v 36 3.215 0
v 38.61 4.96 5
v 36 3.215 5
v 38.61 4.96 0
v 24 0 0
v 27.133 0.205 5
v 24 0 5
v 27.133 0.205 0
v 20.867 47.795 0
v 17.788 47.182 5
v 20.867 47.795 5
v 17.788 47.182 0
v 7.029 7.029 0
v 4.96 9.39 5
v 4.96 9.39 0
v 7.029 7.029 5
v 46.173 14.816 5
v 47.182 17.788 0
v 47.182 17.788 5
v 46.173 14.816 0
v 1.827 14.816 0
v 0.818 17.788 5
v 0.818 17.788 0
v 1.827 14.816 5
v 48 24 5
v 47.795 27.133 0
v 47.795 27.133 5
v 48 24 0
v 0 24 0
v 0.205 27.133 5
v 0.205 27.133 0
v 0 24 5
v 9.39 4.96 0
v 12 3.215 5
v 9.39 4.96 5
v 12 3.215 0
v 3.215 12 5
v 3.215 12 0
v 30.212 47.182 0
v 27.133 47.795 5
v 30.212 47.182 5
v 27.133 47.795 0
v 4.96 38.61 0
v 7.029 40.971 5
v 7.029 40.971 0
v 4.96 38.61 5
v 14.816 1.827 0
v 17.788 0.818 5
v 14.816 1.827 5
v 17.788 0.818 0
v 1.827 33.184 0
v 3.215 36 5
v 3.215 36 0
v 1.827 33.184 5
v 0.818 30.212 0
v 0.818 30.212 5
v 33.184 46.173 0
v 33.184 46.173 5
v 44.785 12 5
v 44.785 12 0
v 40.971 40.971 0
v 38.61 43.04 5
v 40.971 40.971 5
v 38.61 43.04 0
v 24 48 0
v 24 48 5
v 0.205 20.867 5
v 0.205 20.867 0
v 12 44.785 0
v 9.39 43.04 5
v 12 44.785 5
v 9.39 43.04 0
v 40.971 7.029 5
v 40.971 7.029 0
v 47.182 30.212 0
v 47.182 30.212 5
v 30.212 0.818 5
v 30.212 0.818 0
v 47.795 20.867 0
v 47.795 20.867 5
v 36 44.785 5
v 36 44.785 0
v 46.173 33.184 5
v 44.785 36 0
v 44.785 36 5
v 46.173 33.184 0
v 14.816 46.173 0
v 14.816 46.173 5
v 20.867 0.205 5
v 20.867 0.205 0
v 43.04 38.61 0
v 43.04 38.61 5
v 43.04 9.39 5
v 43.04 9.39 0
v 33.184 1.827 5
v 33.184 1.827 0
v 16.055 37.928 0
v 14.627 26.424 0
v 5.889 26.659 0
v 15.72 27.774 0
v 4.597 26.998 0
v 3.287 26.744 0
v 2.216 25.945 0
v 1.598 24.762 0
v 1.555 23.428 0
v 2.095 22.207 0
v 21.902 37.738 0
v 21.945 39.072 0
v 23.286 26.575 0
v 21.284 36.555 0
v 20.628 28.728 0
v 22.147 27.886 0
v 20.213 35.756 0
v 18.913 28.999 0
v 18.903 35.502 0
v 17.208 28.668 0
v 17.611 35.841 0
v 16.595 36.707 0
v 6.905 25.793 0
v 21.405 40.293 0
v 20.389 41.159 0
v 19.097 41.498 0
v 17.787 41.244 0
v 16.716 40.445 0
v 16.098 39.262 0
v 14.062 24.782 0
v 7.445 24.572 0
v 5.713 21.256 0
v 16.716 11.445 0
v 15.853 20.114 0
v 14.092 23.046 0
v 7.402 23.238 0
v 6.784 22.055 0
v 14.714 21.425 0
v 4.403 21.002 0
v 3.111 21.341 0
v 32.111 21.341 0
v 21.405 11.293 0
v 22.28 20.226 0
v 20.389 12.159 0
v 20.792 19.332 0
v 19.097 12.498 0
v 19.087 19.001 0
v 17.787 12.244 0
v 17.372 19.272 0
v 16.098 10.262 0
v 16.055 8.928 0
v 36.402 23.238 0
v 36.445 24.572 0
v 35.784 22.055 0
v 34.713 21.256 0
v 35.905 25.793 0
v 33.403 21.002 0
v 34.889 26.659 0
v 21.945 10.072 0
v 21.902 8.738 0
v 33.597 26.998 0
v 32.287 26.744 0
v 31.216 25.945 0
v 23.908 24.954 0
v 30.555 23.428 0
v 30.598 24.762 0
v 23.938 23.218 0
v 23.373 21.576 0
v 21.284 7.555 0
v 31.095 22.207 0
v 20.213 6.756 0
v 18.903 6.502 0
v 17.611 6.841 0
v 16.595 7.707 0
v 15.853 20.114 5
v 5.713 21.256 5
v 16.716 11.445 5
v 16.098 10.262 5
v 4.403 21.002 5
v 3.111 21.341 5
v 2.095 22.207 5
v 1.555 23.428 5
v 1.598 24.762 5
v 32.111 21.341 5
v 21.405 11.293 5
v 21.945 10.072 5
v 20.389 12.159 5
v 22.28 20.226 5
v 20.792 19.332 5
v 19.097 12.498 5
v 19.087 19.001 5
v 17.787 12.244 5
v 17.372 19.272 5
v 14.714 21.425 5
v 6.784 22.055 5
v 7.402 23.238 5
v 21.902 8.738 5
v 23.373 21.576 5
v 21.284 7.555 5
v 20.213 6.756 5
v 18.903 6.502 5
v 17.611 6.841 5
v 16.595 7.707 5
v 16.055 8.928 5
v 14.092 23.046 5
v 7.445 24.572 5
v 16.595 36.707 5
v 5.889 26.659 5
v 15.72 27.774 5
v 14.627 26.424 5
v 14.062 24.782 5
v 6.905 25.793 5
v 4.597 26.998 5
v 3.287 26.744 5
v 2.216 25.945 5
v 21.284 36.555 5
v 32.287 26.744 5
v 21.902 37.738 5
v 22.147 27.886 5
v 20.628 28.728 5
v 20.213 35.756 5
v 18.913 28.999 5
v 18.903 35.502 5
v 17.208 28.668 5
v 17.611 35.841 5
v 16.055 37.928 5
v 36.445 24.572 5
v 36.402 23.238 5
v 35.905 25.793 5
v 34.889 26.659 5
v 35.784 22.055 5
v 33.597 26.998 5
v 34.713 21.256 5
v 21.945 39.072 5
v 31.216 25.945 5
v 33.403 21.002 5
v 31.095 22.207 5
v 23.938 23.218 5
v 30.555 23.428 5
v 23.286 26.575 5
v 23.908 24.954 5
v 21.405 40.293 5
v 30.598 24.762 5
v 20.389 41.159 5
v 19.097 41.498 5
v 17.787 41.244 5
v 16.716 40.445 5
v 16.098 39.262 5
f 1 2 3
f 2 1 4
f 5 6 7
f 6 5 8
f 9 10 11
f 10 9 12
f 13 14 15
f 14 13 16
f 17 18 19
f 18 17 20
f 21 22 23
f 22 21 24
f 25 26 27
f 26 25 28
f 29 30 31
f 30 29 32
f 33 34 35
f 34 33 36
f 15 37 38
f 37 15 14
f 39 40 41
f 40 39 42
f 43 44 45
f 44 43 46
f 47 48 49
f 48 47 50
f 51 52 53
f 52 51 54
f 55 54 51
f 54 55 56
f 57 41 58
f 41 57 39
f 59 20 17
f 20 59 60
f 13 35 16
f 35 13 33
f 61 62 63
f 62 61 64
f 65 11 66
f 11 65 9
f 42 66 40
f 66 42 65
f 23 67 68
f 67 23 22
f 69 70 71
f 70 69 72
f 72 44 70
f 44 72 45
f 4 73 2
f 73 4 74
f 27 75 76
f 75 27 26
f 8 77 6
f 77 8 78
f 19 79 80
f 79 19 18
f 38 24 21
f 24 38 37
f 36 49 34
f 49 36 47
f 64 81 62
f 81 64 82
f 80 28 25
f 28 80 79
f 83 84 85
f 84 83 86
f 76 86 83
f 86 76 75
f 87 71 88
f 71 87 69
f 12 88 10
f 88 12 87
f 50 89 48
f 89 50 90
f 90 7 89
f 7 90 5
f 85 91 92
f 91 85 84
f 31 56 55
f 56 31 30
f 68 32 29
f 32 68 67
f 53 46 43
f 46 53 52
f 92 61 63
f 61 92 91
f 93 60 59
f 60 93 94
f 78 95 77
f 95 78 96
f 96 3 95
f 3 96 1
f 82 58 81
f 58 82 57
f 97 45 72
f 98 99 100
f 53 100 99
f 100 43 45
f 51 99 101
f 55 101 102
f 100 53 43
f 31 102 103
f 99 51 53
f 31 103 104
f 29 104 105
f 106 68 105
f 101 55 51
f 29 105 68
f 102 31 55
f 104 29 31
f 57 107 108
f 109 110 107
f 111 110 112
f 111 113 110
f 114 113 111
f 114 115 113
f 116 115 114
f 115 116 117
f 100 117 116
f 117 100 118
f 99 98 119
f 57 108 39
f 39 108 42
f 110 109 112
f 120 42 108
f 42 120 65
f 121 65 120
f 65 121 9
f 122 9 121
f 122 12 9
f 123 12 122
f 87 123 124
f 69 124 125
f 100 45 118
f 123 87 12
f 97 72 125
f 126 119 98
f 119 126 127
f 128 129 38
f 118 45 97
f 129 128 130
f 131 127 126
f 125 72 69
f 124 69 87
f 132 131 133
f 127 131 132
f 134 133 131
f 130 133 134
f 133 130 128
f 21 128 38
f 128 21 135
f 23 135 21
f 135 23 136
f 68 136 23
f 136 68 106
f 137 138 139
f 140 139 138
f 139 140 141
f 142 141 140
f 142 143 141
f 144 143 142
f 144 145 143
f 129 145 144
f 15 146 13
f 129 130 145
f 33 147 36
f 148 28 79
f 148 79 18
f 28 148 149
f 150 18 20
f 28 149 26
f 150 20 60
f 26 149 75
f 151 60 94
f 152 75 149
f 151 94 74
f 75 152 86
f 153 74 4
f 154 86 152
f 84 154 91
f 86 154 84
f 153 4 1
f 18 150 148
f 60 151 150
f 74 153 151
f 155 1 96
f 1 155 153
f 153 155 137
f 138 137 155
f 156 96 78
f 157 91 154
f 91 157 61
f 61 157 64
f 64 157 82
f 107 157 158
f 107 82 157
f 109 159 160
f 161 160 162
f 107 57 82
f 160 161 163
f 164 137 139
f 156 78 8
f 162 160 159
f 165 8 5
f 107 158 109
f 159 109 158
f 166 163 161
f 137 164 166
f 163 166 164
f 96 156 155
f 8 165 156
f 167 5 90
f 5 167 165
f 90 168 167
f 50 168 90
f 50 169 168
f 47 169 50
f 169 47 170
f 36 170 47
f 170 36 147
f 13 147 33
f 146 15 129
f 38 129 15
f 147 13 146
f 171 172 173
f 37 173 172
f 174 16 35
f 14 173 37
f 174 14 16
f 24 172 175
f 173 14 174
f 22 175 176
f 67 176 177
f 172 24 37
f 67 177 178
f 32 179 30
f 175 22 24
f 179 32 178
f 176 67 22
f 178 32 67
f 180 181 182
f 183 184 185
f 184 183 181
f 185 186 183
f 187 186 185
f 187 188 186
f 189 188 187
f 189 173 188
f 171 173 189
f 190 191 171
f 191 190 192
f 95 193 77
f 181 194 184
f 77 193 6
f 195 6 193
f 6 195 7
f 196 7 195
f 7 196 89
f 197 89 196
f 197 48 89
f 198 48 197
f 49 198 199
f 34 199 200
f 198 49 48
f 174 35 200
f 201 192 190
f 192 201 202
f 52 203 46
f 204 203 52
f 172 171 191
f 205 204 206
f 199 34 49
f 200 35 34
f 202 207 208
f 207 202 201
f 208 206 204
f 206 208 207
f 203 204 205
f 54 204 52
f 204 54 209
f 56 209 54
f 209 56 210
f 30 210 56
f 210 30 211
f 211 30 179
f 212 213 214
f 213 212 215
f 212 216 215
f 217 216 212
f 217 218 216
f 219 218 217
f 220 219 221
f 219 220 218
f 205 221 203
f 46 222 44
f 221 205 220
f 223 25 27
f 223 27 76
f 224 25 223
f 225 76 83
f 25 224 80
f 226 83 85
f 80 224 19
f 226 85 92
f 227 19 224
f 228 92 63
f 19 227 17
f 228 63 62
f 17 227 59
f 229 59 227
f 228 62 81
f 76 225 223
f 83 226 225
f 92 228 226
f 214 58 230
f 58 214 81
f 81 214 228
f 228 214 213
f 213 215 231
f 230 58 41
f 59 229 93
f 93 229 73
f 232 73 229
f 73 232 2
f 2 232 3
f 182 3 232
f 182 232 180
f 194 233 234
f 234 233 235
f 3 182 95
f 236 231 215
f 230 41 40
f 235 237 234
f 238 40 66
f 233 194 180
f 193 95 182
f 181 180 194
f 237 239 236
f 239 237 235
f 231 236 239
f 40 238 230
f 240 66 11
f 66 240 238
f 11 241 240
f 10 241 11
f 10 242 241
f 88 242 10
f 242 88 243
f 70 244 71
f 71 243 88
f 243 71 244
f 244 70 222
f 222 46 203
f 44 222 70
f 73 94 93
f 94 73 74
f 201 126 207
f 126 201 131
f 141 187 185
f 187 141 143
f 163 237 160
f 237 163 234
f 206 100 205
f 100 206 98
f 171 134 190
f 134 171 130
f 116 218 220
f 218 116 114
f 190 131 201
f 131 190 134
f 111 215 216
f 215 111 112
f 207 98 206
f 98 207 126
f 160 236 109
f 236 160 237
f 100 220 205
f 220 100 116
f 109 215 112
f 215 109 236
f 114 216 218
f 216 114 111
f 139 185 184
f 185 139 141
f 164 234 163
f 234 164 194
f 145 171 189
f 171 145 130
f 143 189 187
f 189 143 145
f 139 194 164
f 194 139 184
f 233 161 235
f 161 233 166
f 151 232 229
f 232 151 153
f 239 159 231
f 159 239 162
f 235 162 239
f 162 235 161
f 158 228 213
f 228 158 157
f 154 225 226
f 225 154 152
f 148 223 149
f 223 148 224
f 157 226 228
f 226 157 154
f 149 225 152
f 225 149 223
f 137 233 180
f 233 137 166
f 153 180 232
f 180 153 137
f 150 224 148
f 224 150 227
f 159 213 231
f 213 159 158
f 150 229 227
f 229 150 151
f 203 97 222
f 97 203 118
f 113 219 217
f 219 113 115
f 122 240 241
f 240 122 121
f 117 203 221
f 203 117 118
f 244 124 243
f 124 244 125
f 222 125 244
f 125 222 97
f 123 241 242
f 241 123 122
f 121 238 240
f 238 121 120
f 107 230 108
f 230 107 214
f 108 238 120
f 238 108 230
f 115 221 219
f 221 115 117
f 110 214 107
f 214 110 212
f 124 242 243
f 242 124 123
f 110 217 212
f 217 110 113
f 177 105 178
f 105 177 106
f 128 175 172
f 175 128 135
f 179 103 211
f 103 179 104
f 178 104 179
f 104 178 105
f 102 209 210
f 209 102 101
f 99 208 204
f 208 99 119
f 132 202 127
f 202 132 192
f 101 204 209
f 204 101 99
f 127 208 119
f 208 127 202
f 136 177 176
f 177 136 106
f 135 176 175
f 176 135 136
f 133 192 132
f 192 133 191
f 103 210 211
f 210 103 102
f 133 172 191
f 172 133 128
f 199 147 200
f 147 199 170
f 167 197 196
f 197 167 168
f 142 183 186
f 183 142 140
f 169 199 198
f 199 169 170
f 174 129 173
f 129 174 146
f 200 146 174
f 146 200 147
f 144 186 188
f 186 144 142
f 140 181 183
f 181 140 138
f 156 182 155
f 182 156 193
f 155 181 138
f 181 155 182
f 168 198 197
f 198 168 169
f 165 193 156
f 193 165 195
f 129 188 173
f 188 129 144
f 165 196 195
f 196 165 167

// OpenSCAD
$fn = 32;

// ----------------------------------------------------------------------
// Cam plate: eccentric cam, base R24
// ----------------------------------------------------------------------

// --- parameters (mm) ---
base_r = 24;              // base circle radius
lobe_h = 12;              // cam lobe rise
bore_r = 5;               // shaft bore radius
plate_t = 5;              // plate thickness, Z (extrusion height)
ecc = 5;                  // disc eccentricity
ring_r = 14.5;            // lightening ring radius
bolt_r = 3;               // lightening hole radius

profile = [[48, 24], [47.795, 27.133], [47.182, 30.212], [46.173, 33.184], [44.785, 36], [43.04, 38.61], [40.971, 40.971], [38.61, 43.04], [36, 44.785], [33.184, 46.173], [30.212, 47.182], [27.133, 47.795], [24, 48], [20.867, 47.795], [17.788, 47.182], [14.816, 46.173], [12, 44.785], [9.39, 43.04], [7.029, 40.971], [4.96, 38.61], [3.215, 36], [1.827, 33.184], [0.818, 30.212], [0.205, 27.133], [0, 24], [0.205, 20.867], [0.818, 17.788], [1.827, 14.816], [3.215, 12], [4.96, 9.39], [7.029, 7.029], [9.39, 4.96], [12, 3.215], [14.816, 1.827], [17.788, 0.818], [20.867, 0.205], [24, 0], [27.133, 0.205], [30.212, 0.818], [33.184, 1.827], [36, 3.215], [38.61, 4.96], [40.971, 7.029], [43.04, 9.39], [44.785, 12], [46.173, 14.816], [47.182, 17.788], [47.795, 20.867]];  // primary outline, 48 points, counter clockwise
void_1 = [[23.908, 24.954], [23.286, 26.575], [22.147, 27.886], [20.628, 28.728], [18.913, 28.999], [17.208, 28.668], [15.72, 27.774], [14.627, 26.424], [14.062, 24.782], [14.092, 23.046], [14.714, 21.425], [15.853, 20.114], [17.372, 19.272], [19.087, 19.001], [20.792, 19.332], [22.28, 20.226], [23.373, 21.576], [23.938, 23.218]];  // shaft bore, 18 points
void_2 = [[36.445, 24.572], [35.905, 25.793], [34.889, 26.659], [33.597, 26.998], [32.287, 26.744], [31.216, 25.945], [30.598, 24.762], [30.555, 23.428], [31.095, 22.207], [32.111, 21.341], [33.403, 21.002], [34.713, 21.256], [35.784, 22.055], [36.402, 23.238]];  // lightening hole 1, 14 points
void_3 = [[21.945, 39.072], [21.405, 40.293], [20.389, 41.159], [19.097, 41.498], [17.787, 41.244], [16.716, 40.445], [16.098, 39.262], [16.055, 37.928], [16.595, 36.707], [17.611, 35.841], [18.903, 35.502], [20.213, 35.756], [21.284, 36.555], [21.902, 37.738]];  // lightening hole 2, 14 points
void_4 = [[7.445, 24.572], [6.905, 25.793], [5.889, 26.659], [4.597, 26.998], [3.287, 26.744], [2.216, 25.945], [1.598, 24.762], [1.555, 23.428], [2.095, 22.207], [3.111, 21.341], [4.403, 21.002], [5.713, 21.256], [6.784, 22.055], [7.402, 23.238]];  // lightening hole 3, 14 points
void_5 = [[21.945, 10.072], [21.405, 11.293], [20.389, 12.159], [19.097, 12.498], [17.787, 12.244], [16.716, 11.445], [16.098, 10.262], [16.055, 8.928], [16.595, 7.707], [17.611, 6.841], [18.903, 6.502], [20.213, 6.756], [21.284, 7.555], [21.902, 8.738]];  // lightening hole 4, 14 points

// --- the one profile operation ---
difference() {
  linear_extrude(height = plate_t) polygon(points = profile);
  translate([0, 0, -1])
    linear_extrude(height = plate_t + 2) polygon(points = void_1);
  translate([0, 0, -1])
    linear_extrude(height = plate_t + 2) polygon(points = void_2);
  translate([0, 0, -1])
    linear_extrude(height = plate_t + 2) polygon(points = void_3);
  translate([0, 0, -1])
    linear_extrude(height = plate_t + 2) polygon(points = void_4);
  translate([0, 0, -1])
    linear_extrude(height = plate_t + 2) polygon(points = void_5);
}
